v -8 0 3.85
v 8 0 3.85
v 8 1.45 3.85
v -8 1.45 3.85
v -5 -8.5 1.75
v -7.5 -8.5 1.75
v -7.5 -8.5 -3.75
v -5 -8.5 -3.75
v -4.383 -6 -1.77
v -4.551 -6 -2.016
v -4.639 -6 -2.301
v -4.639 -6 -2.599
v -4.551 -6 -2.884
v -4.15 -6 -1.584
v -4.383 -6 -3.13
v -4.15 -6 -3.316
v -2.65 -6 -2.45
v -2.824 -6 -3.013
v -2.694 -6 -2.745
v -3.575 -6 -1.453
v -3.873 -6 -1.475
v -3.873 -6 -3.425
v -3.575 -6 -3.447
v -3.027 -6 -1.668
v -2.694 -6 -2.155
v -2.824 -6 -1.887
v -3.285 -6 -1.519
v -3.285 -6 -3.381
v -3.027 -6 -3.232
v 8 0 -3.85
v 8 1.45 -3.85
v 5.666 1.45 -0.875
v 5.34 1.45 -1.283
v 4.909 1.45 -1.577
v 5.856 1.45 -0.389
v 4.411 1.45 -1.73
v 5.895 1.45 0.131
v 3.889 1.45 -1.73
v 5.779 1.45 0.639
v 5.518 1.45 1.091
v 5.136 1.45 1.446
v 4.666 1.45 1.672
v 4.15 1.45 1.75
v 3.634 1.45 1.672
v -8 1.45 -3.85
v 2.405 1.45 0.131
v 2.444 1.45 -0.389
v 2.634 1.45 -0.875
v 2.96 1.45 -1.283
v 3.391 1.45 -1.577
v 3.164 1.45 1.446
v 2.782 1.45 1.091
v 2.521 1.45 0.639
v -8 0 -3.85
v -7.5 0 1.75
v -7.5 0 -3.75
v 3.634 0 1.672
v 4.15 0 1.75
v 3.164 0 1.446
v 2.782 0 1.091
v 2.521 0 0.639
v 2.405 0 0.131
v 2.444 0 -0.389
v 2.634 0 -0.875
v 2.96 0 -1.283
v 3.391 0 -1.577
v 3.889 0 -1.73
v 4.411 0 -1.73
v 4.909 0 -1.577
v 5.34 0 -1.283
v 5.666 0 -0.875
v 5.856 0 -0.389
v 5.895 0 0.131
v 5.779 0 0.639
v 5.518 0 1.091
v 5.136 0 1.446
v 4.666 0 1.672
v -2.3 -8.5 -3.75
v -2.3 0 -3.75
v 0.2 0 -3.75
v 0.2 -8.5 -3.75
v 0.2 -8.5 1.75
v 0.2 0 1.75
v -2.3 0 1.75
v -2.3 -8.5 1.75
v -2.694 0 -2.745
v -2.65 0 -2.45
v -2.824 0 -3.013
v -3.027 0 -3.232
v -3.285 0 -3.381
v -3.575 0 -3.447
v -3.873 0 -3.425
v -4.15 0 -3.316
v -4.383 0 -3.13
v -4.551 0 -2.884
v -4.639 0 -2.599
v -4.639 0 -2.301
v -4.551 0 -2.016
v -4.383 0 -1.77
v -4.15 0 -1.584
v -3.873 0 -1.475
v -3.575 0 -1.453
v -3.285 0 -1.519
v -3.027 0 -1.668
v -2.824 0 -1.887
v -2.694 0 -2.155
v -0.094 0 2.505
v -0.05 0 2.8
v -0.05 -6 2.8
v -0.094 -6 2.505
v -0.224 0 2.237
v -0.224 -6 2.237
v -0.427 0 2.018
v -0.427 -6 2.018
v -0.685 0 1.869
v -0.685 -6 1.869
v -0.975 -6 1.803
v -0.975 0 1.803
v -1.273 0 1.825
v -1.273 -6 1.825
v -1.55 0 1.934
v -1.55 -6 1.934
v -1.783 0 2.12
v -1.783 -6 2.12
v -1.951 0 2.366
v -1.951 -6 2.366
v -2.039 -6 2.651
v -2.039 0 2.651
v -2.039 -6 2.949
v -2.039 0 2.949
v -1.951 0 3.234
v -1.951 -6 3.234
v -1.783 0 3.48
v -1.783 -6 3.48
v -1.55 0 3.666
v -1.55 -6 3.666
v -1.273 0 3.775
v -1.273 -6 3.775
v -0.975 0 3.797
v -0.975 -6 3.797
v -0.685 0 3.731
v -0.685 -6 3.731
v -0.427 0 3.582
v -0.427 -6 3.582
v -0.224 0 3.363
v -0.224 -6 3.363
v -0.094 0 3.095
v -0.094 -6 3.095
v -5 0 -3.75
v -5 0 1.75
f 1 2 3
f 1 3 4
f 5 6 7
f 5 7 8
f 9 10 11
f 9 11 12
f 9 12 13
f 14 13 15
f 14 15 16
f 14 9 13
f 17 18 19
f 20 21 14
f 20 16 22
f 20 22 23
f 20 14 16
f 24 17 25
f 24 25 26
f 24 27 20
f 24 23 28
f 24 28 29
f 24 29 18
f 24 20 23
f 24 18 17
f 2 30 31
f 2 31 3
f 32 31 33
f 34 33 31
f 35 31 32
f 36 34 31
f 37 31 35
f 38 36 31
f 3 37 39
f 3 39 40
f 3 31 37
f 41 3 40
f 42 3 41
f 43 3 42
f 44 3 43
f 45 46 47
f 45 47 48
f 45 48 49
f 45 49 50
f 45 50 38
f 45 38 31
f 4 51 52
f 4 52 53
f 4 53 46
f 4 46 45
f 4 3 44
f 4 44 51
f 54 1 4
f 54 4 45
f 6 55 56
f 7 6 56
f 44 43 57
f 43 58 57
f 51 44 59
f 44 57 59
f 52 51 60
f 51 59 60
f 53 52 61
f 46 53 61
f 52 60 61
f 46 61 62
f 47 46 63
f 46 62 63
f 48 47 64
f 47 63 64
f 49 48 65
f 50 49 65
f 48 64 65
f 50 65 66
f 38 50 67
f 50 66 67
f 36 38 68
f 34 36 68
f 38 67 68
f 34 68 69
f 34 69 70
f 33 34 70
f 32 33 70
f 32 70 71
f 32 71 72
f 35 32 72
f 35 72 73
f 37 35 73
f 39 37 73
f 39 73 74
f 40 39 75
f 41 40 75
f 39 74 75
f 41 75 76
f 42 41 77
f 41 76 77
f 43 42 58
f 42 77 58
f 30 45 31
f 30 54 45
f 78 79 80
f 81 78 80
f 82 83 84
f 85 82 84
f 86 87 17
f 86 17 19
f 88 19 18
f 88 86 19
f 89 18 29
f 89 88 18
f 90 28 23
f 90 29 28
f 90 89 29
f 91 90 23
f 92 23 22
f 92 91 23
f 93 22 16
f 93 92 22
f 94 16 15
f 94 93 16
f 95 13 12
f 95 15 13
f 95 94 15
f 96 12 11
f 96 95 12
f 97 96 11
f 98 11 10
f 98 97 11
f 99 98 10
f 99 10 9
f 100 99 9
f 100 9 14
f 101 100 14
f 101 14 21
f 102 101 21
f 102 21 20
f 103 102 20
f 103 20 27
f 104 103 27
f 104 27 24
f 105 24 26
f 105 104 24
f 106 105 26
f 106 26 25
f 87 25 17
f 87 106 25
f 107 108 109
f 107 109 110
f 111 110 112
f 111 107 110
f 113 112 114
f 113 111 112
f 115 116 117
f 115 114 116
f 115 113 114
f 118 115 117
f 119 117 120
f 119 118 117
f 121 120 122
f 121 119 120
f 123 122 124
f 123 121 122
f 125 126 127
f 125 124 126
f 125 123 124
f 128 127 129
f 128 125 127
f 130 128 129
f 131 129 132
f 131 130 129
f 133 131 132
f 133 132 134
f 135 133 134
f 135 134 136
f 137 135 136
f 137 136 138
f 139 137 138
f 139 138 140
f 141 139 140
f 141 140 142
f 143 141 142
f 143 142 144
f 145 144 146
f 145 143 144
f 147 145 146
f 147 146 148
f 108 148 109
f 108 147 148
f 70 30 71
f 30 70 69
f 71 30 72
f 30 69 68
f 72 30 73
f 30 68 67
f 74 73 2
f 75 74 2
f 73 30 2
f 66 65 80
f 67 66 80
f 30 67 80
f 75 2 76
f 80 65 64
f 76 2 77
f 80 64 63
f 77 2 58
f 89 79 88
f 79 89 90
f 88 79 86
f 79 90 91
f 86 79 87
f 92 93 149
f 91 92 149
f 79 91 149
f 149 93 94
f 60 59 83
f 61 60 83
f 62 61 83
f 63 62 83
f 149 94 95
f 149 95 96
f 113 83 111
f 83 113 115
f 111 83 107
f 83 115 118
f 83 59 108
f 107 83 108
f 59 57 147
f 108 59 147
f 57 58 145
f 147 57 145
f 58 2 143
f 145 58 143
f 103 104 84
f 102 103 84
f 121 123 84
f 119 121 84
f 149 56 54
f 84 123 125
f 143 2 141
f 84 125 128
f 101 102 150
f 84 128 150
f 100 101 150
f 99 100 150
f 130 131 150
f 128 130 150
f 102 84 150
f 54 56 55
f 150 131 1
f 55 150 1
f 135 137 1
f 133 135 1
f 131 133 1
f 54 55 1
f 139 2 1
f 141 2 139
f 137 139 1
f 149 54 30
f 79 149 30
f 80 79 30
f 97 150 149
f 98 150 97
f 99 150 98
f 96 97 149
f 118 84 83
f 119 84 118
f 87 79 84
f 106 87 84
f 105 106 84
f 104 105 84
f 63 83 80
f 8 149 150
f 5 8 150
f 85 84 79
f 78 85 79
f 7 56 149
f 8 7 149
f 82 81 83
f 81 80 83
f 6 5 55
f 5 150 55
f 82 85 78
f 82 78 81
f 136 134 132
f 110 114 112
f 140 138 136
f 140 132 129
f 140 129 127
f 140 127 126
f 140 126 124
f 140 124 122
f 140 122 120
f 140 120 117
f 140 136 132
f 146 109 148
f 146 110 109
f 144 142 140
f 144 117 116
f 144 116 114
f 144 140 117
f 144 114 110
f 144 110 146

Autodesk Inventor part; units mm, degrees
ref_plane "YZ Plane" through (0, 0, 0) normal (1, 0, 0) x (0, 1, 0)
ref_plane "XZ Plane" through (0, 0, 0) normal (0, 1, 0) x (-1, 0, 0)
ref_plane "XY Plane" through (0, 0, 0) normal (0, 0, 1) x (1, 0, 0)
sketch "Náčrt1" plane through (0, 0, 0) normal (0, 1, 0) x (-1, 0, 0)
  line L0 (8, -3.85) -> (-8, -3.85)
  line L1 (-8, -3.85) -> (-8, 3.85)
  line L2 (-8, 3.85) -> (8, 3.85)
  line L3 (8, 3.85) -> (8, -3.85)
  line L4 (8, -3.85) -> (0, 0) construction
  line L5 (8, 3.85) -> (0, 0) construction
  line L6 (-8, -3.85) -> (0, 0) construction
  dimension "d0" = 16
  dimension "d1" = 7.7
extrude "Vysunutí1" add sketch "Náčrt1" along normal blind 1.45
sketch "Náčrt2" plane through (0, 0, 0) normal (0, -1, 0) x (1, 0, 0)
  line L0 (0.2, 1.75) -> (-2.3, 1.75)
  line L1 (-2.3, 1.75) -> (-2.3, -3.75)
  line L2 (-2.3, -3.75) -> (0.2, -3.75)
  line L3 (0.2, -3.75) -> (0.2, 1.75)
  line L4 (-5, 1.75) -> (-7.5, 1.75)
  line L5 (-7.5, 1.75) -> (-7.5, -3.75)
  line L6 (-7.5, -3.75) -> (-5, -3.75)
  line L7 (-5, -3.75) -> (-5, 1.75)
  line L8 (-8, -3.85) -> (-8, 3.85) projected
  line L9 (-2.3, 1.75) -> (-5, 1.75) construction
  circle A0 centre (-3.65, -2.45) radius 1
  circle A1 centre (-1.05, 2.8) radius 1
  line L10 (-1.05, 1.75) -> (-1.05, 2.8) construction
  line L11 (-1.05, 2.8) -> (-1.05, 3.85) construction
  line L12 (-2.3, -2.45) -> (-3.65, -2.45) construction
  line L13 (-3.65, -2.45) -> (-5, -2.45) construction
  line L14 (-3.65, 1.75) -> (-3.65, 0.35) construction
  line L15 (-3.65, 0.35) -> (-3.65, -1.05) construction
  line L16 (-3.65, -1.05) -> (-3.65, -2.45) construction
  line L17 (-3.65, -3.85) -> (-3.65, -2.45) construction
  point P0 (0, 0)
  dimension "d4" = 2.5
  dimension "d5" = 5.5
  dimension "d6" = 0.5
  dimension "d7" = 2
  dimension "d8" = 2.7
  dimension "d15" = 0.1
extrude "Vysunutí2" add sketch "Náčrt2" along normal blind 8.5 contours L3 L2 L1 L0 | L7 L6 L5 L4
extrude "Vysunutí3" add sketch "Náčrt2" along normal blind 6 contours A0 | A1
sketch "Náčrt3" plane through (0, 1.45, 0) normal (0, 1, 0) x (1, 0, 0)
  line L0 (8, -3.85) -> (8, 3.85) projected
  line L1 (8, -3.85) -> (4.15, -3.85)
  line L2 (4.15, -3.85) -> (4.15, 0)
  line L3 (4.15, 0) -> (8, 0)
  line L4 (8, 0) -> (8, -3.85)
  line L5 (8, 3.85) -> (-8, 3.85) projected
  line L6 (8, 3.85) -> (4.15, 3.85)
  line L7 (4.15, 3.85) -> (4.15, 0)
  line L8 (4.15, 0) -> (8, 0)
  line L9 (8, 0) -> (8, 3.85)
  point P0 (0, 0)
hole "Díra1" at (4.15, 1.45, 0) direction (0, -1, 0) diameter 3.5 end through all
properties part number "qre_module"
